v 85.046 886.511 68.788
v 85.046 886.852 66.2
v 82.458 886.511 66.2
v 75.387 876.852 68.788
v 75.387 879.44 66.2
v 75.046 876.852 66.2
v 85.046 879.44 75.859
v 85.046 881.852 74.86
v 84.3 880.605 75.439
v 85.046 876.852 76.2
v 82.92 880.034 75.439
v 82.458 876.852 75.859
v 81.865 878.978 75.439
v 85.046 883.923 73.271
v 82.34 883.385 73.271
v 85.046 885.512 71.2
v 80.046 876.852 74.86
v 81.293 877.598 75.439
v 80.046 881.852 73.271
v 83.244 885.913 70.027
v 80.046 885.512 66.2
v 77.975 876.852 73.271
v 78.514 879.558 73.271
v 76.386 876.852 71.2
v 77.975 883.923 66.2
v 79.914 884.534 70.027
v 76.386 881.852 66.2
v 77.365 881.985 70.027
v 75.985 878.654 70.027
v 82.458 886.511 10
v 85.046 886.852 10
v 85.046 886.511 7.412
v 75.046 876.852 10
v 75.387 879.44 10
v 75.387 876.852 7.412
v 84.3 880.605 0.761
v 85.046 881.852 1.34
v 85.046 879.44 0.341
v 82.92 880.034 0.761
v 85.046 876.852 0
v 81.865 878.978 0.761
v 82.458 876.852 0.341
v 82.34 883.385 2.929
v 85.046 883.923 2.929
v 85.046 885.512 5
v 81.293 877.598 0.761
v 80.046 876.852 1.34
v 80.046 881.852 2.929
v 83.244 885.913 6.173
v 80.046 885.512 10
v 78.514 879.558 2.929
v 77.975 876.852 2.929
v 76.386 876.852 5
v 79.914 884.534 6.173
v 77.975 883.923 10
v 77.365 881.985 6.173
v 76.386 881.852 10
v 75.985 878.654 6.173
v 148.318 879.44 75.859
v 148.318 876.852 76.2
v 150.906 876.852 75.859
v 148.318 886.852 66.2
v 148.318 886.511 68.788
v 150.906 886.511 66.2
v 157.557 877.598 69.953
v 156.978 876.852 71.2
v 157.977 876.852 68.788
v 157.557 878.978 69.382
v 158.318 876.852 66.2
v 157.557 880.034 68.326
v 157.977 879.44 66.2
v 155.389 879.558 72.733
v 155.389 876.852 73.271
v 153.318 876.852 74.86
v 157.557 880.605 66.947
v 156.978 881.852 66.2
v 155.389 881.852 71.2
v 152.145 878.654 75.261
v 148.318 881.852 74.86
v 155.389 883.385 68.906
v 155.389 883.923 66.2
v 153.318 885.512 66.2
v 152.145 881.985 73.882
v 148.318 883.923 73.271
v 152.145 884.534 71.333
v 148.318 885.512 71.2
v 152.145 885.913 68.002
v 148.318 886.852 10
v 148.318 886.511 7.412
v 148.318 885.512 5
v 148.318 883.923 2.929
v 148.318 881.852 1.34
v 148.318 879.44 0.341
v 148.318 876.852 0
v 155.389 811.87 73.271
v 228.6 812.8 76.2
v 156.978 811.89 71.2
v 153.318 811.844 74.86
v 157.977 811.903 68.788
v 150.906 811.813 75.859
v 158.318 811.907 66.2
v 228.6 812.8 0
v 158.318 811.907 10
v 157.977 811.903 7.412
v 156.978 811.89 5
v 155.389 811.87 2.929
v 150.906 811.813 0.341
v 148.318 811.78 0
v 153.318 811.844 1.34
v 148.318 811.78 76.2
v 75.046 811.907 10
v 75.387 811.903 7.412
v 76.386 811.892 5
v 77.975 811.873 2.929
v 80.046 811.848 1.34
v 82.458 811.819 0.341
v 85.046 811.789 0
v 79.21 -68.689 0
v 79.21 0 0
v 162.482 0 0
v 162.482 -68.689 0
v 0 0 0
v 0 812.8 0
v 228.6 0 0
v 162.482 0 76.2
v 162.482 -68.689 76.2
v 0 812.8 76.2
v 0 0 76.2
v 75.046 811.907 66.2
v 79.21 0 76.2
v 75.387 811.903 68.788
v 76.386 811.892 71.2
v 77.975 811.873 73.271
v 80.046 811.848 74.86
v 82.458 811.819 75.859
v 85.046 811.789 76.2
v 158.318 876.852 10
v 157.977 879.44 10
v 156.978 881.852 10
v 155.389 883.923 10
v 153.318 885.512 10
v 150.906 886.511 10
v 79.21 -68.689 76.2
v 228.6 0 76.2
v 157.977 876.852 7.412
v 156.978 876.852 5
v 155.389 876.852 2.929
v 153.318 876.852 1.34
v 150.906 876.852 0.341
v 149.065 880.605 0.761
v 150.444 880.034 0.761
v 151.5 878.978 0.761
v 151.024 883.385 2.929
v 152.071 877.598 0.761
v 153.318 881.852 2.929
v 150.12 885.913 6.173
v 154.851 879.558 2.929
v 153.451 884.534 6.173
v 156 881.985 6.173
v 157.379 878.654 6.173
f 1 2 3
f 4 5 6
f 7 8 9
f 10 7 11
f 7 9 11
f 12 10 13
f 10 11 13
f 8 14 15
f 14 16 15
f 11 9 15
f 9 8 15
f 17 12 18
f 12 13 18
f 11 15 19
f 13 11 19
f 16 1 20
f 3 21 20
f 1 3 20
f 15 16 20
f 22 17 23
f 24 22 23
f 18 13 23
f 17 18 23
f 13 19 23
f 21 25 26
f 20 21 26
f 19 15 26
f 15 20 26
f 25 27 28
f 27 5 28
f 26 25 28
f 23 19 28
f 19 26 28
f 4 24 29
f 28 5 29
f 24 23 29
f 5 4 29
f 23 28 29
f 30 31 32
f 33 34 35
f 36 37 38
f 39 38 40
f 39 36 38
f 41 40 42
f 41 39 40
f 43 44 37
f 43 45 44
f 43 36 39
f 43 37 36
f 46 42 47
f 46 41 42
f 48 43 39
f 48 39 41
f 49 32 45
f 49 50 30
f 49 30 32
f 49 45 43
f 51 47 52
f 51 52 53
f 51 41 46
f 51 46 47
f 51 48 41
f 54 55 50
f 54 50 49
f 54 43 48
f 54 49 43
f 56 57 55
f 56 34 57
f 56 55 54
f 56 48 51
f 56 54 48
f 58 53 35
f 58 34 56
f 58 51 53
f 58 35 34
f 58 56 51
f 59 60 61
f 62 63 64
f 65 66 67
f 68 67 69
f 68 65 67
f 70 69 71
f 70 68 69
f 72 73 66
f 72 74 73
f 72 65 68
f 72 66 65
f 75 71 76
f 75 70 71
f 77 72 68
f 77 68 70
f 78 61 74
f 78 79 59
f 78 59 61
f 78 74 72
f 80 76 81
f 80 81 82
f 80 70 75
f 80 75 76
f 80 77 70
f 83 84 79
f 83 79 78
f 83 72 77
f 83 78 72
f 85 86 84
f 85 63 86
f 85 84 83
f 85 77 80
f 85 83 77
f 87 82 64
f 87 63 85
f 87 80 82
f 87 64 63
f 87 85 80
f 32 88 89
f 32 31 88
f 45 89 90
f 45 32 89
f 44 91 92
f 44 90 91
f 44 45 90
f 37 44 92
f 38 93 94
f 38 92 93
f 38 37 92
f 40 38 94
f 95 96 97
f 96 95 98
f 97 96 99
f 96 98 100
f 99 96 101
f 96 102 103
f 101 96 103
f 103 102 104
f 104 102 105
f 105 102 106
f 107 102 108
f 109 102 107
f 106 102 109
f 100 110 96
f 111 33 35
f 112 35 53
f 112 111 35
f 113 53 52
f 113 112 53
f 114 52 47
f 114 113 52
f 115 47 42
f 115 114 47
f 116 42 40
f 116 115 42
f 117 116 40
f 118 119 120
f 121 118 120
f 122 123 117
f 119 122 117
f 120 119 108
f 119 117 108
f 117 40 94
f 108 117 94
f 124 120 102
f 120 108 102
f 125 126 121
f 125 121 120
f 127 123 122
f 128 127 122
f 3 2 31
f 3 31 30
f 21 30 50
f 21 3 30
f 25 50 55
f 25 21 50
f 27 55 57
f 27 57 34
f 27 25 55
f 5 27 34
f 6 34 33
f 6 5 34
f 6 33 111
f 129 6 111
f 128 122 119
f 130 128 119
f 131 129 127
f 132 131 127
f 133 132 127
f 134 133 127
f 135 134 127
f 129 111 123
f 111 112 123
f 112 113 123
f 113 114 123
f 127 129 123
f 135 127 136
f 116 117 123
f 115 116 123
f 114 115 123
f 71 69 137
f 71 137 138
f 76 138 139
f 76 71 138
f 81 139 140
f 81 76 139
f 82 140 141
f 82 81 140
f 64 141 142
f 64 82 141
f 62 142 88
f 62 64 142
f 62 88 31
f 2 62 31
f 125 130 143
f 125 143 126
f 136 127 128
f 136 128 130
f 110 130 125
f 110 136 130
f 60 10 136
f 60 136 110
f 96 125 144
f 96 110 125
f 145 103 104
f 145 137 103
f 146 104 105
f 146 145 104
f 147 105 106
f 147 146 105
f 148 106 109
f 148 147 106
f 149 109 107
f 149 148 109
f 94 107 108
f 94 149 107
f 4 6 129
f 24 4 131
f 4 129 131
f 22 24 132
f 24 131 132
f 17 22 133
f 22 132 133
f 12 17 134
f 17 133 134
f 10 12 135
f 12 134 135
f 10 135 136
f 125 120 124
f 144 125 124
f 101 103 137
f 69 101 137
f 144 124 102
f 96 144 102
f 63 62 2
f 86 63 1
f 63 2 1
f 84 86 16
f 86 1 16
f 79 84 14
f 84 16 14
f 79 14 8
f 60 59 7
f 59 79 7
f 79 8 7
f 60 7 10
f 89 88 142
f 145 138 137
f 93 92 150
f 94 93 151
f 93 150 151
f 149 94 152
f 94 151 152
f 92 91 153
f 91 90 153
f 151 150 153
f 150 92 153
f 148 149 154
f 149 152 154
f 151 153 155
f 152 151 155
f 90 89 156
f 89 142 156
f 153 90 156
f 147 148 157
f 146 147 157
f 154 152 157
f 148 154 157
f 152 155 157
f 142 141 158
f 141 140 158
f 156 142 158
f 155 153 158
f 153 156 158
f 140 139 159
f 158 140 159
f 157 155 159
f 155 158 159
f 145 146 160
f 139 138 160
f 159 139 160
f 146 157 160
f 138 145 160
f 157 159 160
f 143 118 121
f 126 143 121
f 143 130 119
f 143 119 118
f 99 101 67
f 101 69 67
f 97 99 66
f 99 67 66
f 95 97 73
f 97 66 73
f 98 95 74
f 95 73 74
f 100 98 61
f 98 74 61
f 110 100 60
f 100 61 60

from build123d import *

# Parameters (mm, degrees)
F1_DEPTH = 76.2
F2_R     = 10


with BuildPart() as f1:
    # F0 (on Top) → F1 (new body)
    with BuildSketch(Plane.XY):
        Polygon((75.046457, 811.90747), (0, 812.8), (0, 0), (79.210013, 0), (79.210013, -68.688758), (162.481502, -68.688758), (162.481502, 0), (228.6, 0), (228.6, 812.8), (158.317953, 811.90747), (158.317953, 886.851847), (75.046457, 886.851847), align=None)
    extrude(amount=F1_DEPTH)

    # F2
    f2_edges = [f1.edges().sort_by_distance(p)[0] for p in [
        (75.046457, 886.851847, 38.1),
        (116.682205, 886.851847, 76.2),
        (75.046457, 849.379659, 76.2),
        (158.317953, 849.379659, 76.2),
        (158.317953, 886.851847, 38.1),
        (116.682205, 886.851847, 0),
        (75.046457, 849.379659, 0),
        (158.317953, 849.379659, 0),
    ]]
    fillet(f2_edges, radius=F2_R)


solid = f1.part
